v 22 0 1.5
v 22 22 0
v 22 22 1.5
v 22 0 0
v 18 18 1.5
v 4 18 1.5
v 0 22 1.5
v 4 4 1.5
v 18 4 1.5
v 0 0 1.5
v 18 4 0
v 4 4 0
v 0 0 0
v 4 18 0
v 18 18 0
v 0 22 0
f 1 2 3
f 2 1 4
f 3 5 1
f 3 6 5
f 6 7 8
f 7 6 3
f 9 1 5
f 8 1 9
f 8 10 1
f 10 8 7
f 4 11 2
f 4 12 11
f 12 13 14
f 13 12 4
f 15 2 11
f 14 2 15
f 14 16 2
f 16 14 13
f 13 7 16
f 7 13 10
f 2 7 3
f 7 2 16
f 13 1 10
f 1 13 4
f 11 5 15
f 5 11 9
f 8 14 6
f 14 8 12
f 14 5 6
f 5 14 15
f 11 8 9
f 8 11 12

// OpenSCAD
$fn=120;

// Params Cherry knock out
cko_width=14.00;
cko_high=14.00;
cko_thick=1.50;
cko_frame=8.00;

// Cherry knock out
difference() {
    cube([cko_width+cko_frame, cko_high+cko_frame, cko_thick]);
    translate([cko_frame/2,cko_frame/2, -0.01]) cube([cko_width, cko_high, cko_thick+1]); 

    // debug
    //translate([0, 0, -0.01]) cube(90);
}

//// Small round buttons
//smbut_rad=5.04;
//smbut_x=[6.00];
//smbut_y=6.00;
//
//// Example small round button studs
//for (i = smbut_x) {
//    translate([i, smbut_y, 0]) cylinder(8, 2, 2);
//    translate([i+smbut_rad*2, smbut_y, 0]) cylinder(8, 2, 2);
//    translate([i, smbut_y+smbut_rad*2, 0]) cylinder(8, 2, 2);
//    translate([i+smbut_rad*2, smbut_y+smbut_rad*2, 0]) cylinder(8, 2, 2);
//    // Example switch
////    translate([smbut_rad+i, smbut_rad+smbut_y, 25]) color("pink") union() {
////        cube([14.57, 14.57, 18], center=true);
////        translate([0, 0, -21]) cylinder(12.3, 2.55, 2.55);
////    }
//}
